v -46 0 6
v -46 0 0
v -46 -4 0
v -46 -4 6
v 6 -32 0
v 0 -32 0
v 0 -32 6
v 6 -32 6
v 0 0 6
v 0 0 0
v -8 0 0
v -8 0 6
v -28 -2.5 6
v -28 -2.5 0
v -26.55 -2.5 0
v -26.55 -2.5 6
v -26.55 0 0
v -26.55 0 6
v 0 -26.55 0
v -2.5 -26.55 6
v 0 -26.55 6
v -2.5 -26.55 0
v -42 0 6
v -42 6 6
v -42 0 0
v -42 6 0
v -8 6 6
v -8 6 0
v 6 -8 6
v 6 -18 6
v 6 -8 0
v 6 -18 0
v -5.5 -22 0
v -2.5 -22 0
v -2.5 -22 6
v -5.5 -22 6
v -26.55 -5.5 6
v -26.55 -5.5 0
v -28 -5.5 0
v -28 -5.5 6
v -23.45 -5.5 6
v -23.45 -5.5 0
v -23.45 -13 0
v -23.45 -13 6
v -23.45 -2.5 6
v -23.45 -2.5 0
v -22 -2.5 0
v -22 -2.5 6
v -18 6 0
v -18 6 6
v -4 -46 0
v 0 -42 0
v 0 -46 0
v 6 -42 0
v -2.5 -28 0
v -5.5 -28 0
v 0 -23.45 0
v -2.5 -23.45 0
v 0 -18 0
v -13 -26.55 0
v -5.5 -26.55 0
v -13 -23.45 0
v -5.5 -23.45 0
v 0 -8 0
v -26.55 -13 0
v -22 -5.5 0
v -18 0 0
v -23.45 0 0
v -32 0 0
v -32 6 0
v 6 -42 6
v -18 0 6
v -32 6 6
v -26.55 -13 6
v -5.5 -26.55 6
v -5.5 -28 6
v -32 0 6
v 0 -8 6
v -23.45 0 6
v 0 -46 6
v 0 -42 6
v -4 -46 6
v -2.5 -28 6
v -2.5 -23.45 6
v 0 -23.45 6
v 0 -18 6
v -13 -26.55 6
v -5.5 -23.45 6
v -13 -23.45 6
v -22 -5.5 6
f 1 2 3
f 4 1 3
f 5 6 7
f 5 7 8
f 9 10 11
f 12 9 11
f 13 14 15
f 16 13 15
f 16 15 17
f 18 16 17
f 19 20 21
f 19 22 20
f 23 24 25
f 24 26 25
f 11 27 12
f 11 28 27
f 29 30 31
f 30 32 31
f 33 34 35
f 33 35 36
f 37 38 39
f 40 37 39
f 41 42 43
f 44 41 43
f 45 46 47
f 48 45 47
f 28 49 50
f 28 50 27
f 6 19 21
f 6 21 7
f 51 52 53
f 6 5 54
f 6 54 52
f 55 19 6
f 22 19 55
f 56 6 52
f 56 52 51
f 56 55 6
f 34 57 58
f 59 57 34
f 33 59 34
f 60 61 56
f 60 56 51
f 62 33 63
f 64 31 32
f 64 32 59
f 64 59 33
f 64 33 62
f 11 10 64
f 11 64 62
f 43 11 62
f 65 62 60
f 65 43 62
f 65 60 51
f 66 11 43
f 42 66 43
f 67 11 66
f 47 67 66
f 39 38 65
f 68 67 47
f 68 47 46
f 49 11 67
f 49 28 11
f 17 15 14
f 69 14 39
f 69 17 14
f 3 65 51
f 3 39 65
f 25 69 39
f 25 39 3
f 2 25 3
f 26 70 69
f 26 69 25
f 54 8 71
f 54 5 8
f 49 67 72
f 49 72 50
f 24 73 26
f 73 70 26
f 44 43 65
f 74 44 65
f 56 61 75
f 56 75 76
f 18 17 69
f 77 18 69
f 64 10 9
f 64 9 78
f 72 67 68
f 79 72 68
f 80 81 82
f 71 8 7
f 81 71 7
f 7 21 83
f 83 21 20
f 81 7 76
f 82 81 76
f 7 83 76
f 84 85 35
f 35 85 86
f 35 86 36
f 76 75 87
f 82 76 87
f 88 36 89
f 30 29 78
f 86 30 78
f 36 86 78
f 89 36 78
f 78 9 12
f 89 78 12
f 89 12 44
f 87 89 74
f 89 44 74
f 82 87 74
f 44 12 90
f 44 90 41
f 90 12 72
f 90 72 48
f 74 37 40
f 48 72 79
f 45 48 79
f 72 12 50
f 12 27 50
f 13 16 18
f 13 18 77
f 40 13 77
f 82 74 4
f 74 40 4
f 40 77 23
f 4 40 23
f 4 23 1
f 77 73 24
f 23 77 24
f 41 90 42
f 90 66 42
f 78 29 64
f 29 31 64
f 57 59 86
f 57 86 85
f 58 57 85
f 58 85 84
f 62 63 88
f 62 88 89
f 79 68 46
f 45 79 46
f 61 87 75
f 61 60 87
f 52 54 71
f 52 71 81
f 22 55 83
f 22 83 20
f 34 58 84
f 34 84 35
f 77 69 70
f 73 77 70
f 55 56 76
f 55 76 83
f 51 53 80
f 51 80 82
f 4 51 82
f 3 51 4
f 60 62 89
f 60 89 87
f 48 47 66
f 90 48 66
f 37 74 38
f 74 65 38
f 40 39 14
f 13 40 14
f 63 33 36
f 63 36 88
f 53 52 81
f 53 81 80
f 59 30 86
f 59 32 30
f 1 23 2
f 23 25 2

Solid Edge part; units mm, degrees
sketch "Sketch1" plane through (0, 0, 0) normal (0, 0, -1) x (-1, 0, 0)
  line L0 (4, -46) -> (46, -4)
  line L1 (46, 0) -> (46, -4)
  line L2 (42, 0) -> (46, 0)
  line L3 (42, 6) -> (42, 0)
  line L4 (32, 6) -> (42, 6)
  line L5 (32, 0) -> (32, 6)
  line L6 (26.55, 0) -> (32, 0)
  line L7 (26.55, -2.5) -> (26.55, 0)
  line L8 (28, -2.5) -> (26.55, -2.5)
  line L9 (28, -5.5) -> (28, -2.5)
  line L10 (26.55, -5.5) -> (28, -5.5)
  line L11 (26.55, -13) -> (26.55, -5.5)
  line L12 (23.45, -13) -> (26.55, -13)
  line L13 (23.45, -5.5) -> (23.45, -13)
  line L14 (22, -5.5) -> (23.45, -5.5)
  line L15 (22, -2.5) -> (22, -5.5)
  line L16 (23.45, -2.5) -> (22, -2.5)
  line L17 (23.45, 0) -> (23.45, -2.5)
  line L18 (18, 0) -> (23.45, 0)
  line L19 (18, 0) -> (18, 6)
  line L20 (18, 6) -> (8, 6)
  line L21 (8, 6) -> (8, 0)
  line L22 (0, 0) -> (8, 0)
  line L23 (0, 0) -> (0, -8)
  line L24 (-6, -8) -> (0, -8)
  line L25 (-6, -18) -> (-6, -8)
  line L26 (-6, -18) -> (0, -18)
  line L27 (0, -18) -> (0, -23.45)
  line L28 (0, -23.45) -> (2.5, -23.45)
  line L29 (2.5, -23.45) -> (2.5, -22)
  line L30 (2.5, -22) -> (5.5, -22)
  line L31 (5.5, -22) -> (5.5, -23.45)
  line L32 (5.5, -23.45) -> (13, -23.45)
  line L33 (13, -23.45) -> (13, -26.55)
  line L34 (13, -26.55) -> (5.5, -26.55)
  line L35 (5.5, -26.55) -> (5.5, -28)
  line L36 (5.5, -28) -> (2.5, -28)
  line L37 (2.5, -28) -> (2.5, -26.55)
  line L38 (2.5, -26.55) -> (0, -26.55)
  line L39 (0, -26.55) -> (0, -32)
  line L40 (0, -32) -> (-6, -32)
  line L41 (-6, -32) -> (-6, -42)
  line L42 (-6, -42) -> (0, -42)
  line L43 (0, -42) -> (0, -46)
  line L44 (0, -46) -> (4, -46)
extrude "Protrusion1" add sketch "Sketch1" against normal blind 6
